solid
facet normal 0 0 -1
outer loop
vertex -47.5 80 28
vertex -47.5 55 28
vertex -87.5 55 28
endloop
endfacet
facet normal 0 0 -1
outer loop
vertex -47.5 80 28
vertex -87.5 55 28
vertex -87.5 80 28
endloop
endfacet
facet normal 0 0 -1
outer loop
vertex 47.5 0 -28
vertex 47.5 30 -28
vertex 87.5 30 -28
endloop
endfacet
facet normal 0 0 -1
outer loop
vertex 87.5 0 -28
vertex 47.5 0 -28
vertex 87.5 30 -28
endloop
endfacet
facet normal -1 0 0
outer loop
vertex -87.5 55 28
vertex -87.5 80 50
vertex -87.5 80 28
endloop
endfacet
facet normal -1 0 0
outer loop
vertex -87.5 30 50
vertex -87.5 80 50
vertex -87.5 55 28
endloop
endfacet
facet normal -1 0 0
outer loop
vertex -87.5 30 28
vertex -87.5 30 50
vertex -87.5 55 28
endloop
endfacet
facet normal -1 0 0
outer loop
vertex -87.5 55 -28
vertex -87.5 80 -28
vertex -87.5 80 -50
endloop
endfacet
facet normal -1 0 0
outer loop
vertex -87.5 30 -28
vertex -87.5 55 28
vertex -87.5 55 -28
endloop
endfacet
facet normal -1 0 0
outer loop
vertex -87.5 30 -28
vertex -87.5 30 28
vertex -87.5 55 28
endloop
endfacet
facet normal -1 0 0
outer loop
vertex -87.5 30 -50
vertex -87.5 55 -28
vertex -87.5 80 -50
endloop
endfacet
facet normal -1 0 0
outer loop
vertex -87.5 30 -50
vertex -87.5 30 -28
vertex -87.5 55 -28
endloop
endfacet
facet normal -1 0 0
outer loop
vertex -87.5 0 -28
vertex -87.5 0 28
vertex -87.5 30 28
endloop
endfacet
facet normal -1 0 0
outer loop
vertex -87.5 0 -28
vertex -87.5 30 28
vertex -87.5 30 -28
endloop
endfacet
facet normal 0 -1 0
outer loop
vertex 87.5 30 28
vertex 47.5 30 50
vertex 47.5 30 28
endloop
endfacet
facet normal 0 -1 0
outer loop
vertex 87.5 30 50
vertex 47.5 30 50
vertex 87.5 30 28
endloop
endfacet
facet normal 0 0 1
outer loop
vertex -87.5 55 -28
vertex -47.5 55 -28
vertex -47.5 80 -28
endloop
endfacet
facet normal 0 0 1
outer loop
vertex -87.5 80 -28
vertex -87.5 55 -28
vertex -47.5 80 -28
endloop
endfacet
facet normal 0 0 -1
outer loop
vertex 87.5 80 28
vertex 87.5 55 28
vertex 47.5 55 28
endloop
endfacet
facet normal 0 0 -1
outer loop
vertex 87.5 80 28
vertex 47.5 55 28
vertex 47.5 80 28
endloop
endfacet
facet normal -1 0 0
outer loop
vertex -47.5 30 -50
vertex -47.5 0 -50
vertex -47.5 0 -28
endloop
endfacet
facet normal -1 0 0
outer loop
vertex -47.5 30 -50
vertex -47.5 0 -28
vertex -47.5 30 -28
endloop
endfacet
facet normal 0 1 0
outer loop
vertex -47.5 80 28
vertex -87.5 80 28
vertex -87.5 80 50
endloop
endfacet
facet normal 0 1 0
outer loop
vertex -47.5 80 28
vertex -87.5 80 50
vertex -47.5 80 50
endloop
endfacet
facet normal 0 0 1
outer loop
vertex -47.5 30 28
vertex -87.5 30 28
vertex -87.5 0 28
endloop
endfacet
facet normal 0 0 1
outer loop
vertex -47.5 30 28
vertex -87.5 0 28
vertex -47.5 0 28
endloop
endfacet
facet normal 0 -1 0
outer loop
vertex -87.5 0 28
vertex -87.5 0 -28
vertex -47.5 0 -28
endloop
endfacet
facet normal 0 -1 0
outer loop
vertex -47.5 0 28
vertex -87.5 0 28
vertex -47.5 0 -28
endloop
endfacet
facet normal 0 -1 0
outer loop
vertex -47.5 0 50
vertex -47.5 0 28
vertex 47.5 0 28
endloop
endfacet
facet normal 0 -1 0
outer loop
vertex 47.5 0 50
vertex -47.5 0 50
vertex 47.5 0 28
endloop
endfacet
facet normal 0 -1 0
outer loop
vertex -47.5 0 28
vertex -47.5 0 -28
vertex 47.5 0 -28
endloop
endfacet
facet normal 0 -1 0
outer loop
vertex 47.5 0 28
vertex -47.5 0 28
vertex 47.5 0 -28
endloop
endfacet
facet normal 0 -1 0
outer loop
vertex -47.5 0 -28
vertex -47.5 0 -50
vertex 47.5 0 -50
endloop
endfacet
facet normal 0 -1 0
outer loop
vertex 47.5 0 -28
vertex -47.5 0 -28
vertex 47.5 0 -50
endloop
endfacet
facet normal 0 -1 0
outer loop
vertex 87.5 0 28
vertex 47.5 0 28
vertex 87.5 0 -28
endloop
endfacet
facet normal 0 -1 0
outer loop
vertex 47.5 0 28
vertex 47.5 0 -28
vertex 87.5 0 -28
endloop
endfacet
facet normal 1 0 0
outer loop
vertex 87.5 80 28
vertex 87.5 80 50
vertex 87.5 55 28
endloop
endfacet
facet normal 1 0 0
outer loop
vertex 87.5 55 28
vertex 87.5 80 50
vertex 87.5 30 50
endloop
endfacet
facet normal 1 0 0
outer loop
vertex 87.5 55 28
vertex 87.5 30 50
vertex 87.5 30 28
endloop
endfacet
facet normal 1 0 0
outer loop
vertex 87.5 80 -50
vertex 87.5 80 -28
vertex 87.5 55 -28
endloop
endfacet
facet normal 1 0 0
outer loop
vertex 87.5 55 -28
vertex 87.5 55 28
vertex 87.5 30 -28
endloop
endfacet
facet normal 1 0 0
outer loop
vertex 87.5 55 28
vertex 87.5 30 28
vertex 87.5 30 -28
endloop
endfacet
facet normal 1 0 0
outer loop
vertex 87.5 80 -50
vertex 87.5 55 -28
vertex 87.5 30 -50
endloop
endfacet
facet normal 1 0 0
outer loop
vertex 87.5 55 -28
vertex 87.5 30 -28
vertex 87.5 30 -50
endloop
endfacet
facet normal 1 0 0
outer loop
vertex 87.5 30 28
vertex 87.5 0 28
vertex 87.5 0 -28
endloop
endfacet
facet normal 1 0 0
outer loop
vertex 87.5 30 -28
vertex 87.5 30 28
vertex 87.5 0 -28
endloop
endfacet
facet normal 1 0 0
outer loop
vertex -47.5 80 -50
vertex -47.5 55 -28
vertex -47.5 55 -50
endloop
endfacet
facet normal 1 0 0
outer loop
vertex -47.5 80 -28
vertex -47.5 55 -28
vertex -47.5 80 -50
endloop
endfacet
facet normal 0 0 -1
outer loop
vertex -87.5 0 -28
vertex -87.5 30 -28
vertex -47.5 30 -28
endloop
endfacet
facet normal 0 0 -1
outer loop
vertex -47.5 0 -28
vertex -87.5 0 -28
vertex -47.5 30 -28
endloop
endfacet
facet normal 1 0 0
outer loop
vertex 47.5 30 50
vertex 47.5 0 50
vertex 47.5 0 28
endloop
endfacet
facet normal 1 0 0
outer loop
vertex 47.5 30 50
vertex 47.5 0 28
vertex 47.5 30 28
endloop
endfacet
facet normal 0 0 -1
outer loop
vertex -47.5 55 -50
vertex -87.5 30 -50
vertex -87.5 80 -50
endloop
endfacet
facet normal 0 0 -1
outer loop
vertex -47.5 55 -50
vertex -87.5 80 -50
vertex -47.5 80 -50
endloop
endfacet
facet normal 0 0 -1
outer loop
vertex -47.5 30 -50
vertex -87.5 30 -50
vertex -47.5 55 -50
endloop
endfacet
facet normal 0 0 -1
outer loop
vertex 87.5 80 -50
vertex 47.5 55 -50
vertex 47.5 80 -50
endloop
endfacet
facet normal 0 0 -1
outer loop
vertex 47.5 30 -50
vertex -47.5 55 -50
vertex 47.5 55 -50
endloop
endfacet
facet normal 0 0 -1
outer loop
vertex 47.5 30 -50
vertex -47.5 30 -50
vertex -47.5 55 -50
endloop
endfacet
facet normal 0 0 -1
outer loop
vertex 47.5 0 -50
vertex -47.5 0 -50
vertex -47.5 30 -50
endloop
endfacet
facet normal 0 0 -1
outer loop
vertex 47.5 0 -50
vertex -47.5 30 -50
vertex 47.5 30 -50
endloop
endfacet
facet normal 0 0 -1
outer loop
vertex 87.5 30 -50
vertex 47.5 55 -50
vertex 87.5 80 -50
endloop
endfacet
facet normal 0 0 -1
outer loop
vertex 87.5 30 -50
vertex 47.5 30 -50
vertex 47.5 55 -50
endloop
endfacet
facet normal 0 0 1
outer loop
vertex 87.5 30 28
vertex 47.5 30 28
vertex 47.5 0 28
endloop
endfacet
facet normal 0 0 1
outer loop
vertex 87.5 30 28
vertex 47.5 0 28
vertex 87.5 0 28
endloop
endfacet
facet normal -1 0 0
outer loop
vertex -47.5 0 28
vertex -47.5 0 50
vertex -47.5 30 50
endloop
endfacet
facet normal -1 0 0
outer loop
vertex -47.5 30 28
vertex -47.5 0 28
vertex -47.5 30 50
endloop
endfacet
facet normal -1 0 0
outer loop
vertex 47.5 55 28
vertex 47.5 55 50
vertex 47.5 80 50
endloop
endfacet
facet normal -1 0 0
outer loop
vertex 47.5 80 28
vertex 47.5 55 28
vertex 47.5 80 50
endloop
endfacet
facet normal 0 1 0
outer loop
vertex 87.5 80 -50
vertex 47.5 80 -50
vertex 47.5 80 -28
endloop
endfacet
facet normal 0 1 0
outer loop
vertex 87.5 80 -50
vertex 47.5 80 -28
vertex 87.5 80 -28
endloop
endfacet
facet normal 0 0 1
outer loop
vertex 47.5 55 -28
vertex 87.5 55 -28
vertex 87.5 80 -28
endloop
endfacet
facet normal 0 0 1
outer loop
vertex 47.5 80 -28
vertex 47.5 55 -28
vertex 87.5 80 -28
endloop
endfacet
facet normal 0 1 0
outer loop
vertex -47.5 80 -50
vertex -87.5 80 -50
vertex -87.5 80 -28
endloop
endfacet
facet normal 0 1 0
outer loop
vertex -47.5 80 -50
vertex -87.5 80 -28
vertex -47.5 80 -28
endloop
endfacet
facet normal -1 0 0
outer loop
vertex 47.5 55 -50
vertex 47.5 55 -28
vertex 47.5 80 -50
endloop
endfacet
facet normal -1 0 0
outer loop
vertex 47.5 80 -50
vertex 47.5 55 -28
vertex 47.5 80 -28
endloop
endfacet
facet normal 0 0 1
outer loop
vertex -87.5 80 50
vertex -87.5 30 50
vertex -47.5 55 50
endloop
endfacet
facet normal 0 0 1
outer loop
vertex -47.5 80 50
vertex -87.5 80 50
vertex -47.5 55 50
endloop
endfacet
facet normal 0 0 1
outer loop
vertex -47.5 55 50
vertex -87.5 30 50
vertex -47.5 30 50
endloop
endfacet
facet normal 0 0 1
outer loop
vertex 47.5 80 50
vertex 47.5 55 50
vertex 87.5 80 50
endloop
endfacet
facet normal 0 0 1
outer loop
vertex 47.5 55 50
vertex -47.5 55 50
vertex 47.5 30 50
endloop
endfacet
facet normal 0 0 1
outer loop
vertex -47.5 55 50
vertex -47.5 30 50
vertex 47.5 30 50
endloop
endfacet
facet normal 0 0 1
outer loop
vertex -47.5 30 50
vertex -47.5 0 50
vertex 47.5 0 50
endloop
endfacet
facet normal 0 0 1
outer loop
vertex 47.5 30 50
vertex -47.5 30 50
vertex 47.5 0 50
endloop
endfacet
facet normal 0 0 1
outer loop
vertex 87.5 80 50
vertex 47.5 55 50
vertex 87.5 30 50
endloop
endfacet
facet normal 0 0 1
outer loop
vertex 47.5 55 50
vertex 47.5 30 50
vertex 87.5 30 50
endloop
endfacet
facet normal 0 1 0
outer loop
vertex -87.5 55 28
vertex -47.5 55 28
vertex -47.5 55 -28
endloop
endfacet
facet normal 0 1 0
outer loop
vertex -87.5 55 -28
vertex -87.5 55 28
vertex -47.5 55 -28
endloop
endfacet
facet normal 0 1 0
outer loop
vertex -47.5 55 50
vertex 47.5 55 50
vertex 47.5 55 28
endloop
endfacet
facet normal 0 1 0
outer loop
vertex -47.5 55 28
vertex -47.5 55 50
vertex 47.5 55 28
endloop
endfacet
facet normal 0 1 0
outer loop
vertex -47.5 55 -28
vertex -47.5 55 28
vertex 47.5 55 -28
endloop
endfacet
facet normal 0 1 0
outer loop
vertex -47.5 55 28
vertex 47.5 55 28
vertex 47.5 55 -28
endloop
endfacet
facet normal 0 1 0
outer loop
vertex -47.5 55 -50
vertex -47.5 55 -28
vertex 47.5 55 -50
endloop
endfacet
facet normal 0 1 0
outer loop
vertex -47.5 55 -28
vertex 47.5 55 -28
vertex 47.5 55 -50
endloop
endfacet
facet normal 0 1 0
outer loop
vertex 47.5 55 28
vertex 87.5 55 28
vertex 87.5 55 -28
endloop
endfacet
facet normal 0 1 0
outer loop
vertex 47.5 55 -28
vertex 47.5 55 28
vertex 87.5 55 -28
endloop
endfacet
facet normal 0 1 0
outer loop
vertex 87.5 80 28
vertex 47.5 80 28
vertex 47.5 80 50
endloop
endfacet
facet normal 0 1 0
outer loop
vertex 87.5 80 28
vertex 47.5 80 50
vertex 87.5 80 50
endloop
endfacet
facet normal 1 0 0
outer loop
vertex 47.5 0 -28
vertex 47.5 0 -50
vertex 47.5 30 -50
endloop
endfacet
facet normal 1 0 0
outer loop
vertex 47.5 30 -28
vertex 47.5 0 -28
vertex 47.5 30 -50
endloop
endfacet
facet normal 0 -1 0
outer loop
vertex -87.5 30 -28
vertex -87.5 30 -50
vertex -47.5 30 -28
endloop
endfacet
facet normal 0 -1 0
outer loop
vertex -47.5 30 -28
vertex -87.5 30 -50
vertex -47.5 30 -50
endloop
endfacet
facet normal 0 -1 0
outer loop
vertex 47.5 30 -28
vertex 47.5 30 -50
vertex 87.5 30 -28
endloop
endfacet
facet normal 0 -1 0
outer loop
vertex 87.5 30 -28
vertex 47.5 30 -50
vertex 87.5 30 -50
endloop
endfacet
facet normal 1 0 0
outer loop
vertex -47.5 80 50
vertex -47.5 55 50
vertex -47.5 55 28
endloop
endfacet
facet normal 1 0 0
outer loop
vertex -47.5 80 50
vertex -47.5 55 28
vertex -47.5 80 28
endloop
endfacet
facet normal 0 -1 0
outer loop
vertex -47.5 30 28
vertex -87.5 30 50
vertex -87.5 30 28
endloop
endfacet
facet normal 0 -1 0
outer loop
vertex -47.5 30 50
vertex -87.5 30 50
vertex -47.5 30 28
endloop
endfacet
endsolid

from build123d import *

# Parameters (mm, degrees)
SKETCH1_W           = 175
SKETCH1_H           = 100
BOSS_EXTRUDE1_DEPTH = 80
SKETCH2_W           = 95
SKETCH2_H           = 25
CUT_EXTRUDE1_DEPTH  = 101
SKETCH3_W           = 56
SKETCH3_H           = 25
CUT_EXTRUDE2_DEPTH  = 176
SKETCH4_W           = 40
SKETCH4_H           = 30
CUT_EXTRUDE3_DEPTH  = 22


with BuildPart() as part:
    # Sketch1 → Boss-Extrude1 (new body)
    with BuildSketch(Plane(origin=(0, 0, 0), x_dir=(1, 0, 0), z_dir=(0, 1, 0))):
        Rectangle(SKETCH1_W, SKETCH1_H)
    extrude(amount=BOSS_EXTRUDE1_DEPTH)

    # Sketch2 → Cut-Extrude1 (cut, through all)
    with BuildSketch(Plane.XY.offset(50)):
        with Locations((0, 67.5)):
            Rectangle(SKETCH2_W, SKETCH2_H)
    extrude(amount=-CUT_EXTRUDE1_DEPTH, mode=Mode.SUBTRACT)

    # Sketch3 → Cut-Extrude2 (cut, through all)
    with BuildSketch(Plane(origin=(87.5, 0, 0), x_dir=(0, 0, -1), z_dir=(1, 0, 0))):
        with Locations((0, 67.5)):
            Rectangle(SKETCH3_W, SKETCH3_H)
    extrude(amount=-CUT_EXTRUDE2_DEPTH, mode=Mode.SUBTRACT)

    # Sketch4 → Cut-Extrude3 (cut)
    with BuildSketch(Plane.XY.offset(50)):
        with Locations((-67.5, 15)):
            Rectangle(SKETCH4_W, SKETCH4_H)
        with Locations((67.5, 15)):
            Rectangle(SKETCH4_W, SKETCH4_H)
    cut_extrude3 = extrude(amount=-CUT_EXTRUDE3_DEPTH, mode=Mode.SUBTRACT)

    # Mirror1: Cut-Extrude3 across plane
    add(cut_extrude3.mirror(Plane.XY), mode=Mode.SUBTRACT)


solid = part.part
